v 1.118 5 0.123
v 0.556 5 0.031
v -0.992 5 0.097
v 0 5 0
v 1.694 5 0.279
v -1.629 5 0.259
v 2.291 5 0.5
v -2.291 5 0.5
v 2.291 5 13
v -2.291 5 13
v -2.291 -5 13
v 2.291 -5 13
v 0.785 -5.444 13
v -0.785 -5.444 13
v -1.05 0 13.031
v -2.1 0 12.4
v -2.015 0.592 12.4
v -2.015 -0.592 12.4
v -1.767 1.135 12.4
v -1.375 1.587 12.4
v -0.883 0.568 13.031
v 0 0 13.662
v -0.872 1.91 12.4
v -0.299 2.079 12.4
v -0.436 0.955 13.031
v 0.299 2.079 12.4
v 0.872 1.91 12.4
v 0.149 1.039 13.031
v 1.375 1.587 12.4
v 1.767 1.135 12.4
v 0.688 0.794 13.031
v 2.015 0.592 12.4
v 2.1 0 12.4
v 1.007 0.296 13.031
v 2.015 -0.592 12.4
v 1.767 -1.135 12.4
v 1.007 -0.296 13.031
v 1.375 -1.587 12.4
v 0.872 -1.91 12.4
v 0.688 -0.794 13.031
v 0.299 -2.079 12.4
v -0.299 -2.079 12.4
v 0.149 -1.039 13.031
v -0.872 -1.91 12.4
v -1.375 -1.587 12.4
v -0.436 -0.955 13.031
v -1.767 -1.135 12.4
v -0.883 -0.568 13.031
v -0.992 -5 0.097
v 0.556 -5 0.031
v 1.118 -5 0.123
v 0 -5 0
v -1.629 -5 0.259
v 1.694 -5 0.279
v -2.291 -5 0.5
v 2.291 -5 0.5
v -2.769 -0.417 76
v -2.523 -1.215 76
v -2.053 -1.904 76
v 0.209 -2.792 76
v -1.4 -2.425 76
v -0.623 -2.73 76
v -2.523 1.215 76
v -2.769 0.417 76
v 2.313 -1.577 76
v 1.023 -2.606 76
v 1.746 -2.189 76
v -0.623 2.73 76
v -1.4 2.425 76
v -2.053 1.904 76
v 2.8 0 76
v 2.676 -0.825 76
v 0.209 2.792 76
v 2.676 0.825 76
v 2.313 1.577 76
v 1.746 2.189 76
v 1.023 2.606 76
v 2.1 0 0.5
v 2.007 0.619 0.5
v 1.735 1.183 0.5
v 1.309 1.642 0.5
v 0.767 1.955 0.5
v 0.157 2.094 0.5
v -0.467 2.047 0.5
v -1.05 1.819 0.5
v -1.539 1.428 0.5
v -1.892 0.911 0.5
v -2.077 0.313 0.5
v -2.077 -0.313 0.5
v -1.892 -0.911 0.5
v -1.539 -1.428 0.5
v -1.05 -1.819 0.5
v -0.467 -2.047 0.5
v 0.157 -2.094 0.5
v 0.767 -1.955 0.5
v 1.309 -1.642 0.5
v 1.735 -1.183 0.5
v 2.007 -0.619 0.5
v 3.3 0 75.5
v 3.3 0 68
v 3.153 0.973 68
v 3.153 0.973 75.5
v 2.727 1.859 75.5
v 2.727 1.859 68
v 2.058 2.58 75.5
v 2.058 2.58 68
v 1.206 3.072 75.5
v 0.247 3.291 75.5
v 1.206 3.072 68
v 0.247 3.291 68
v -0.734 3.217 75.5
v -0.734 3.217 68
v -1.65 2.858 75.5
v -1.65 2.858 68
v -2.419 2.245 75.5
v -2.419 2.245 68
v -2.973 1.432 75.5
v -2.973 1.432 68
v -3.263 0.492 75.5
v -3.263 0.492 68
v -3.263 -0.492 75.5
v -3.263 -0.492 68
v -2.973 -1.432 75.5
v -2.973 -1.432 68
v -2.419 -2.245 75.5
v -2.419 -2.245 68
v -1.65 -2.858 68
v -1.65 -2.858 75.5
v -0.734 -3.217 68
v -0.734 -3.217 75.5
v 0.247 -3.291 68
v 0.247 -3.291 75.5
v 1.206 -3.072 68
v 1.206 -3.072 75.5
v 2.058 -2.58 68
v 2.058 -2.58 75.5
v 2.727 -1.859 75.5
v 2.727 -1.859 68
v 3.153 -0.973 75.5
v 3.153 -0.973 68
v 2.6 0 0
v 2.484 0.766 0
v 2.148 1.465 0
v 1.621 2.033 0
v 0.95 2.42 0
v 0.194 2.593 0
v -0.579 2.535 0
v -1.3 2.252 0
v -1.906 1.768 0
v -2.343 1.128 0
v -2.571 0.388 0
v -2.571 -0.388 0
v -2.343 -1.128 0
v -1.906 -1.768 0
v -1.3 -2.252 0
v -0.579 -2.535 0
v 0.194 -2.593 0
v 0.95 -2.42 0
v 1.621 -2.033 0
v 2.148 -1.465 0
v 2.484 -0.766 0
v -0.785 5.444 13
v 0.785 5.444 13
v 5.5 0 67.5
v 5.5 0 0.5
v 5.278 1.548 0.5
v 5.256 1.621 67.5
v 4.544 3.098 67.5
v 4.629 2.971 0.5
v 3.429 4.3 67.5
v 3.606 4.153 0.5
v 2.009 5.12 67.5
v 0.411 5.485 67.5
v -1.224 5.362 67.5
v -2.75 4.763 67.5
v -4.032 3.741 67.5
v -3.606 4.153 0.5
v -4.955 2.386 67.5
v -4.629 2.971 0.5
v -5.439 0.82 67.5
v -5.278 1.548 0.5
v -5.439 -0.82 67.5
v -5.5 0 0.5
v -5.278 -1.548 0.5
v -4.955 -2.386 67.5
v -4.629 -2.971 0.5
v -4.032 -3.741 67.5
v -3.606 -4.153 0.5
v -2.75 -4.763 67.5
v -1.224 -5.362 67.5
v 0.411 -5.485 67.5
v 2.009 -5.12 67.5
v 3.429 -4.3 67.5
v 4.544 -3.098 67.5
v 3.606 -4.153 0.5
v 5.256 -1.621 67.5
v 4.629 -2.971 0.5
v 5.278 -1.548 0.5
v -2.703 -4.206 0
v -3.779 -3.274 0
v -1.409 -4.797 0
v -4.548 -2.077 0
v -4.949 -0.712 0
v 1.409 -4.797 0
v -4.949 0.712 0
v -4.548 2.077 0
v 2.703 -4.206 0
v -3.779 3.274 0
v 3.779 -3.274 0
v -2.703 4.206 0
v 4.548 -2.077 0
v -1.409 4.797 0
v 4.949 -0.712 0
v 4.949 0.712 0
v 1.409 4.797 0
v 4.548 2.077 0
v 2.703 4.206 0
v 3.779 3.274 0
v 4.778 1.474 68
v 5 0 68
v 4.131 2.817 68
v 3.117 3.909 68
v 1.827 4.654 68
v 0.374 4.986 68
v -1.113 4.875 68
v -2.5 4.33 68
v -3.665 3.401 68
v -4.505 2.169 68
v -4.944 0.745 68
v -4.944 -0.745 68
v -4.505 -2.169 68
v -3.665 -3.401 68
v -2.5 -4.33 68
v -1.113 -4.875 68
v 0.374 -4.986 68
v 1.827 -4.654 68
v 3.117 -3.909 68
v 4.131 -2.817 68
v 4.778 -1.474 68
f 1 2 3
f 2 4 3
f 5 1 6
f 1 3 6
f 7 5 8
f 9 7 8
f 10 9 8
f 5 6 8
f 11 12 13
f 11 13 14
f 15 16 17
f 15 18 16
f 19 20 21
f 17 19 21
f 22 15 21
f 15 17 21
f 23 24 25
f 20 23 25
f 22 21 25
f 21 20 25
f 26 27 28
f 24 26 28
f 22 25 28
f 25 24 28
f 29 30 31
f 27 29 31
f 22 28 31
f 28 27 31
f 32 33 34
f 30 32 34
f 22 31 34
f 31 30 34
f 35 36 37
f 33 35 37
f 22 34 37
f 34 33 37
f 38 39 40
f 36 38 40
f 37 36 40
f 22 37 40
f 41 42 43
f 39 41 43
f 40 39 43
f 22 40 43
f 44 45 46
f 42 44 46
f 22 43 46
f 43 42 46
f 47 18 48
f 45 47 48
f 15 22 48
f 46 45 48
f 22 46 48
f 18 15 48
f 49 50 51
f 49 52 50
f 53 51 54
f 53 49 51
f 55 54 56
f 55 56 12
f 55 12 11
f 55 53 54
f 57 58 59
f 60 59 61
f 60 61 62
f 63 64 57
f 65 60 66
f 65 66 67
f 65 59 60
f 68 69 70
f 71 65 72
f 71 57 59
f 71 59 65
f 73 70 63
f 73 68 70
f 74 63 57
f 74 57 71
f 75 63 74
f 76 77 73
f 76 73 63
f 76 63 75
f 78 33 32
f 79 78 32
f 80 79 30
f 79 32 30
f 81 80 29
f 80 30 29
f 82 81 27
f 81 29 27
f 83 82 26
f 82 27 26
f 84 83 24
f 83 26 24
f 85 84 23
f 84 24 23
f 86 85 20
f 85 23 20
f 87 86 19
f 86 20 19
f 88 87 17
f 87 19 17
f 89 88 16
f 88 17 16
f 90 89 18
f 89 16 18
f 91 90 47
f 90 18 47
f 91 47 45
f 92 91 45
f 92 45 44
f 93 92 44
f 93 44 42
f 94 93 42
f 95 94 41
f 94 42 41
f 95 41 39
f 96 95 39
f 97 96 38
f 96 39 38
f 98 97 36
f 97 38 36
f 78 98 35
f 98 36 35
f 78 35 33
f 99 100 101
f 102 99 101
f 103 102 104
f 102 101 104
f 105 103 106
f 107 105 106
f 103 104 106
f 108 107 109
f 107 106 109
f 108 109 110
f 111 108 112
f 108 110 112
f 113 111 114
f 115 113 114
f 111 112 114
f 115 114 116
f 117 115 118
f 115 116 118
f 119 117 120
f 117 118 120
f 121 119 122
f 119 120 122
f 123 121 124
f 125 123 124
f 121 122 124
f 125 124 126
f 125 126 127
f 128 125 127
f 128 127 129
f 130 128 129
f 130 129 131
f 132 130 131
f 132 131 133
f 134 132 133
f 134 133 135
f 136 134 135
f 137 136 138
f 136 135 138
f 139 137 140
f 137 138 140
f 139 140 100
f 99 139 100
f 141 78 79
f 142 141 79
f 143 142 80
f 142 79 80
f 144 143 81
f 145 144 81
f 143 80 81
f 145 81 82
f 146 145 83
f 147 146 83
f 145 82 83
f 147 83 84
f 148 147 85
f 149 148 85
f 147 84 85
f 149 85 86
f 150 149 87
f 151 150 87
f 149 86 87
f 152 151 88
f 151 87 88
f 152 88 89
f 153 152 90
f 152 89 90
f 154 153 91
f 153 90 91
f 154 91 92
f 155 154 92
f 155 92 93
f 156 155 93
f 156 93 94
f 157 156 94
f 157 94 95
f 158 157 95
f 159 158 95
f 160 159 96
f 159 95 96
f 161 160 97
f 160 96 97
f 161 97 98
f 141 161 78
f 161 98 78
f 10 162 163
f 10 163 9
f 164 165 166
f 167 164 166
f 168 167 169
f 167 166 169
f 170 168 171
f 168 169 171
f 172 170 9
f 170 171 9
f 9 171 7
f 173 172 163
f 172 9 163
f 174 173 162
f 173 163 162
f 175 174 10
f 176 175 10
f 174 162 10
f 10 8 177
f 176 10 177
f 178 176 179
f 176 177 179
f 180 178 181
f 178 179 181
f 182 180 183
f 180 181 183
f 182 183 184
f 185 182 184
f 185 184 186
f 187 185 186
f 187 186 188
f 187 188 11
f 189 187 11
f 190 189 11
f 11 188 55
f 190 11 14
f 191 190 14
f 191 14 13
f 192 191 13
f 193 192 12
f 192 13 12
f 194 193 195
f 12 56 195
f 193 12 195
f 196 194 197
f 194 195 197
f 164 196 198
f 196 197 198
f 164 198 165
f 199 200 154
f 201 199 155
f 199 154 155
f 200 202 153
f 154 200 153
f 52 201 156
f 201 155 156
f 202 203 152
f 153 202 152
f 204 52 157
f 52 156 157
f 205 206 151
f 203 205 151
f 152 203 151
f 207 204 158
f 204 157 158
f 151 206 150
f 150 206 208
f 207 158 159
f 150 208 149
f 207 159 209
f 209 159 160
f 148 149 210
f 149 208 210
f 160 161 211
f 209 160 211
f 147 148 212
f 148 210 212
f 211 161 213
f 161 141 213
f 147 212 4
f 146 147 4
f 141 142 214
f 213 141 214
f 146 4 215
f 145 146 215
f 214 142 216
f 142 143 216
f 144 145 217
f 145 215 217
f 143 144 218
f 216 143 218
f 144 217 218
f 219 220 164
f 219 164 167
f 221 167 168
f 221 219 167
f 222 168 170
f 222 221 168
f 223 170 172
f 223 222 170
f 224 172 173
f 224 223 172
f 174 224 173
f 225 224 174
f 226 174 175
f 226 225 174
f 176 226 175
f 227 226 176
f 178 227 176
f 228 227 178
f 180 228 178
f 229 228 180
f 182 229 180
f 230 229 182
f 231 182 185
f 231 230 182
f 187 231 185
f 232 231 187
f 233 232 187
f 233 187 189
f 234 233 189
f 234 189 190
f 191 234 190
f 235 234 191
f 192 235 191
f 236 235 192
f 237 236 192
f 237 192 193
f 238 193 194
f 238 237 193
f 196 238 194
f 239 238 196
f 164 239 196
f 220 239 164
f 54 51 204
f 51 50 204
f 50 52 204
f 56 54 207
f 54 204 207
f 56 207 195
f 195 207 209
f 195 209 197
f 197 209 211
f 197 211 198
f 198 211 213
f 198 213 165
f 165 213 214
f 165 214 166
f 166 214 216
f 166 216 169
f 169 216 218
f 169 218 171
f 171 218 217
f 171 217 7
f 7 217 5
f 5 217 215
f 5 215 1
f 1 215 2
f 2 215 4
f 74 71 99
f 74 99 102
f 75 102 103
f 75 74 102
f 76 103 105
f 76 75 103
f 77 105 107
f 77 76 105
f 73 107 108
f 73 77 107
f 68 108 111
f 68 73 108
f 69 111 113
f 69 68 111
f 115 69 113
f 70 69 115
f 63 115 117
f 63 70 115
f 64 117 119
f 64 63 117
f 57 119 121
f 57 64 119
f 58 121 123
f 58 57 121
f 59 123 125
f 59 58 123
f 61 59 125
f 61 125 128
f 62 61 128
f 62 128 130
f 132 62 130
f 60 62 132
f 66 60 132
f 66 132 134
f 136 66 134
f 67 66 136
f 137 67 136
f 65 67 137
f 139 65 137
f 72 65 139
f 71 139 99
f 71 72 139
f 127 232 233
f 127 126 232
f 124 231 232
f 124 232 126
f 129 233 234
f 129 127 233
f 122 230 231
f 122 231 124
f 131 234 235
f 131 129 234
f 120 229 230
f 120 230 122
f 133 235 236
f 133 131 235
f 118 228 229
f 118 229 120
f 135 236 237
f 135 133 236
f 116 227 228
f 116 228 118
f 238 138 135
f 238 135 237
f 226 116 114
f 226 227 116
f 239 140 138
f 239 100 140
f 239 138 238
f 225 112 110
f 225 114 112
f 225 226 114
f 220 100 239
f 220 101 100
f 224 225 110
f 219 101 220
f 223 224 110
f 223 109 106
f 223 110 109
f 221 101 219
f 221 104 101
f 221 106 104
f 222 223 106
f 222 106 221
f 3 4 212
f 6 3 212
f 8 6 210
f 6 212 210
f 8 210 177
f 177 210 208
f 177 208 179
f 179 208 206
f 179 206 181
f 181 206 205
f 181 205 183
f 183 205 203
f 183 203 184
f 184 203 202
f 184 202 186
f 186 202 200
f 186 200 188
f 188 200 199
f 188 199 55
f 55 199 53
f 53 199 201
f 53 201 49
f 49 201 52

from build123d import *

# Parameters (mm, degrees)
SKETCH_1_R             = 5.5
EXTRUDE_1_DEPTH        = 68
CHAMFER_1_SIZE         = 0.5
SKETCH_2_R             = 3.3
EXTRUDE_2_DEPTH        = 8
CHAMFER_2_SIZE         = 0.5
HOLE_WIZARD_M5_1_D     = 4.2
HOLE_WIZARD_M5_1_DEPTH = 12.4
HOLE_WIZARD_M5_1_TIP   = 1.2618073
CHAMFER_3_SIZE         = 0.5
SKETCH_6_W             = 10
SKETCH_6_H             = 3
CUT_EXTRUDE_1_DEPTH    = 13


with BuildPart() as part:
    # 草图1 → 拉伸1 (new body)
    with BuildSketch(Plane.XY):
        Circle(SKETCH_1_R)
    extrude(amount=EXTRUDE_1_DEPTH)

    # 倒角1
    chamfer_1_edges = [part.edges().sort_by_distance(p)[0] for p in [
        (-5.5, 0, 0),
        (-5.5, 0, 68),
    ]]
    chamfer(chamfer_1_edges, length=CHAMFER_1_SIZE)

    # 草图2 → 拉伸2 (add)
    with BuildSketch(Plane.XY.offset(68)):
        Circle(SKETCH_2_R)
    extrude(amount=EXTRUDE_2_DEPTH)

    # 倒角2
    chamfer_2_edges = [part.edges().sort_by_distance(p)[0] for p in [
        (-3.3, 0, 76),
    ]]
    chamfer(chamfer_2_edges, length=CHAMFER_2_SIZE)

    # M5 螺纹孔1
    with Locations(Plane(origin=(0, 0, 0), x_dir=(-1, 0, 0), z_dir=(0, 0, -1))):
        with Locations((0, 0)):
            Hole(HOLE_WIZARD_M5_1_D / 2, depth=HOLE_WIZARD_M5_1_DEPTH)
            with Locations((0, 0, -(HOLE_WIZARD_M5_1_DEPTH + HOLE_WIZARD_M5_1_TIP / 2))):  # 118° drill point
                Cone(0, HOLE_WIZARD_M5_1_D / 2, HOLE_WIZARD_M5_1_TIP, mode=Mode.SUBTRACT)

    # 倒角3
    chamfer_3_edges = [part.edges().sort_by_distance(p)[0] for p in [
        (-2.1, 0, 0),
    ]]
    chamfer(chamfer_3_edges, length=CHAMFER_3_SIZE)

    # 草图6 → 切除-拉伸1 (cut)
    with BuildSketch(Plane(origin=(0, 0, 0), x_dir=(-1, 0, 0), z_dir=(0, 0, -1))):
        with Locations((0, 6.5)):
            Rectangle(SKETCH_6_W, SKETCH_6_H)
        with Locations((0, -6.5)):
            Rectangle(SKETCH_6_W, SKETCH_6_H)
    extrude(amount=-CUT_EXTRUDE_1_DEPTH, mode=Mode.SUBTRACT)


solid = part.part
